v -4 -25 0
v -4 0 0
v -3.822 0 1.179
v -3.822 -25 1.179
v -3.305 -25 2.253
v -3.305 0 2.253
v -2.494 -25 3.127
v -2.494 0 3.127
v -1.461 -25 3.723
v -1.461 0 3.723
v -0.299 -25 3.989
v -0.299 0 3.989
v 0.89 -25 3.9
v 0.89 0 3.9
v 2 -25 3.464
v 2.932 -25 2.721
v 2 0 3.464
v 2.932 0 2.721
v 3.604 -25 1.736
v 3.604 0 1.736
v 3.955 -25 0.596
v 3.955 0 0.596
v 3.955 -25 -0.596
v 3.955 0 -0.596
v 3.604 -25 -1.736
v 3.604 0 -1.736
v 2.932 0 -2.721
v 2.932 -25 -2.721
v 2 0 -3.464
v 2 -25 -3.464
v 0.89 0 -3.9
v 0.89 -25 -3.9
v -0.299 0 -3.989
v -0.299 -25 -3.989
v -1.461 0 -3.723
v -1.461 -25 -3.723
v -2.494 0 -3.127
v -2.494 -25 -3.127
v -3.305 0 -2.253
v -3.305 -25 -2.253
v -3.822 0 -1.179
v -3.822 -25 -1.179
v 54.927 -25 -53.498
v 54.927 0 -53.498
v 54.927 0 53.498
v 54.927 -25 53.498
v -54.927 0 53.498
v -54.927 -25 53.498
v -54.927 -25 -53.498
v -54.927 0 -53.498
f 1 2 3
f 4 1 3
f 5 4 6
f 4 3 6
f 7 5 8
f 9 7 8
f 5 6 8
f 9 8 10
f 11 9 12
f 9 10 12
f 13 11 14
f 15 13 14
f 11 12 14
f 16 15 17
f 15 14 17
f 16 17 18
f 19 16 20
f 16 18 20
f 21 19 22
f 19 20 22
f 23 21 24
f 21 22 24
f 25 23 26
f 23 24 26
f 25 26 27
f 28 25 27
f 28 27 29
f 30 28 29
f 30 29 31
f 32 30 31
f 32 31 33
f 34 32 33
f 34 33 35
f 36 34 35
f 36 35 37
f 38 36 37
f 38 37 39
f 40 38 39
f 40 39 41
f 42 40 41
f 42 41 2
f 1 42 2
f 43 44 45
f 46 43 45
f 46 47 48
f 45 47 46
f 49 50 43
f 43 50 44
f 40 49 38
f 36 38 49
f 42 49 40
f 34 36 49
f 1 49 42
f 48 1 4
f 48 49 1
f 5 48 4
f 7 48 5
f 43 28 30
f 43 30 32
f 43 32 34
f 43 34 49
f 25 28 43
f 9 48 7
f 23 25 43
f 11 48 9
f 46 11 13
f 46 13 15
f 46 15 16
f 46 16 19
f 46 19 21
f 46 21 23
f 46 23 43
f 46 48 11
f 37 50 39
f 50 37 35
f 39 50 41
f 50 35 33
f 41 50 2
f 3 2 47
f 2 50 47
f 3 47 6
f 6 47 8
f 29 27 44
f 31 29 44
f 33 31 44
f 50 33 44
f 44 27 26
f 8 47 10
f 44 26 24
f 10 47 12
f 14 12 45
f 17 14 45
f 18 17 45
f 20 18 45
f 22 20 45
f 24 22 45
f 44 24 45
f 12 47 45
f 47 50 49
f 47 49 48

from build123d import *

# Parameters (mm, degrees)
F0_W     = 109.854222
F0_H     = 106.995612
F1_DEPTH = 25
F3_D     = 8


with BuildPart() as f1:
    # F0 (on Front) → F1 (new body)
    with BuildSketch(Plane.XZ):
        Rectangle(F0_W, F0_H)
    extrude(amount=F1_DEPTH)

    # F3 (through all)
    with Locations(Plane.XZ.offset(25)):
        with Locations((0, 0)):
            Hole(F3_D / 2)


solid = f1.part
